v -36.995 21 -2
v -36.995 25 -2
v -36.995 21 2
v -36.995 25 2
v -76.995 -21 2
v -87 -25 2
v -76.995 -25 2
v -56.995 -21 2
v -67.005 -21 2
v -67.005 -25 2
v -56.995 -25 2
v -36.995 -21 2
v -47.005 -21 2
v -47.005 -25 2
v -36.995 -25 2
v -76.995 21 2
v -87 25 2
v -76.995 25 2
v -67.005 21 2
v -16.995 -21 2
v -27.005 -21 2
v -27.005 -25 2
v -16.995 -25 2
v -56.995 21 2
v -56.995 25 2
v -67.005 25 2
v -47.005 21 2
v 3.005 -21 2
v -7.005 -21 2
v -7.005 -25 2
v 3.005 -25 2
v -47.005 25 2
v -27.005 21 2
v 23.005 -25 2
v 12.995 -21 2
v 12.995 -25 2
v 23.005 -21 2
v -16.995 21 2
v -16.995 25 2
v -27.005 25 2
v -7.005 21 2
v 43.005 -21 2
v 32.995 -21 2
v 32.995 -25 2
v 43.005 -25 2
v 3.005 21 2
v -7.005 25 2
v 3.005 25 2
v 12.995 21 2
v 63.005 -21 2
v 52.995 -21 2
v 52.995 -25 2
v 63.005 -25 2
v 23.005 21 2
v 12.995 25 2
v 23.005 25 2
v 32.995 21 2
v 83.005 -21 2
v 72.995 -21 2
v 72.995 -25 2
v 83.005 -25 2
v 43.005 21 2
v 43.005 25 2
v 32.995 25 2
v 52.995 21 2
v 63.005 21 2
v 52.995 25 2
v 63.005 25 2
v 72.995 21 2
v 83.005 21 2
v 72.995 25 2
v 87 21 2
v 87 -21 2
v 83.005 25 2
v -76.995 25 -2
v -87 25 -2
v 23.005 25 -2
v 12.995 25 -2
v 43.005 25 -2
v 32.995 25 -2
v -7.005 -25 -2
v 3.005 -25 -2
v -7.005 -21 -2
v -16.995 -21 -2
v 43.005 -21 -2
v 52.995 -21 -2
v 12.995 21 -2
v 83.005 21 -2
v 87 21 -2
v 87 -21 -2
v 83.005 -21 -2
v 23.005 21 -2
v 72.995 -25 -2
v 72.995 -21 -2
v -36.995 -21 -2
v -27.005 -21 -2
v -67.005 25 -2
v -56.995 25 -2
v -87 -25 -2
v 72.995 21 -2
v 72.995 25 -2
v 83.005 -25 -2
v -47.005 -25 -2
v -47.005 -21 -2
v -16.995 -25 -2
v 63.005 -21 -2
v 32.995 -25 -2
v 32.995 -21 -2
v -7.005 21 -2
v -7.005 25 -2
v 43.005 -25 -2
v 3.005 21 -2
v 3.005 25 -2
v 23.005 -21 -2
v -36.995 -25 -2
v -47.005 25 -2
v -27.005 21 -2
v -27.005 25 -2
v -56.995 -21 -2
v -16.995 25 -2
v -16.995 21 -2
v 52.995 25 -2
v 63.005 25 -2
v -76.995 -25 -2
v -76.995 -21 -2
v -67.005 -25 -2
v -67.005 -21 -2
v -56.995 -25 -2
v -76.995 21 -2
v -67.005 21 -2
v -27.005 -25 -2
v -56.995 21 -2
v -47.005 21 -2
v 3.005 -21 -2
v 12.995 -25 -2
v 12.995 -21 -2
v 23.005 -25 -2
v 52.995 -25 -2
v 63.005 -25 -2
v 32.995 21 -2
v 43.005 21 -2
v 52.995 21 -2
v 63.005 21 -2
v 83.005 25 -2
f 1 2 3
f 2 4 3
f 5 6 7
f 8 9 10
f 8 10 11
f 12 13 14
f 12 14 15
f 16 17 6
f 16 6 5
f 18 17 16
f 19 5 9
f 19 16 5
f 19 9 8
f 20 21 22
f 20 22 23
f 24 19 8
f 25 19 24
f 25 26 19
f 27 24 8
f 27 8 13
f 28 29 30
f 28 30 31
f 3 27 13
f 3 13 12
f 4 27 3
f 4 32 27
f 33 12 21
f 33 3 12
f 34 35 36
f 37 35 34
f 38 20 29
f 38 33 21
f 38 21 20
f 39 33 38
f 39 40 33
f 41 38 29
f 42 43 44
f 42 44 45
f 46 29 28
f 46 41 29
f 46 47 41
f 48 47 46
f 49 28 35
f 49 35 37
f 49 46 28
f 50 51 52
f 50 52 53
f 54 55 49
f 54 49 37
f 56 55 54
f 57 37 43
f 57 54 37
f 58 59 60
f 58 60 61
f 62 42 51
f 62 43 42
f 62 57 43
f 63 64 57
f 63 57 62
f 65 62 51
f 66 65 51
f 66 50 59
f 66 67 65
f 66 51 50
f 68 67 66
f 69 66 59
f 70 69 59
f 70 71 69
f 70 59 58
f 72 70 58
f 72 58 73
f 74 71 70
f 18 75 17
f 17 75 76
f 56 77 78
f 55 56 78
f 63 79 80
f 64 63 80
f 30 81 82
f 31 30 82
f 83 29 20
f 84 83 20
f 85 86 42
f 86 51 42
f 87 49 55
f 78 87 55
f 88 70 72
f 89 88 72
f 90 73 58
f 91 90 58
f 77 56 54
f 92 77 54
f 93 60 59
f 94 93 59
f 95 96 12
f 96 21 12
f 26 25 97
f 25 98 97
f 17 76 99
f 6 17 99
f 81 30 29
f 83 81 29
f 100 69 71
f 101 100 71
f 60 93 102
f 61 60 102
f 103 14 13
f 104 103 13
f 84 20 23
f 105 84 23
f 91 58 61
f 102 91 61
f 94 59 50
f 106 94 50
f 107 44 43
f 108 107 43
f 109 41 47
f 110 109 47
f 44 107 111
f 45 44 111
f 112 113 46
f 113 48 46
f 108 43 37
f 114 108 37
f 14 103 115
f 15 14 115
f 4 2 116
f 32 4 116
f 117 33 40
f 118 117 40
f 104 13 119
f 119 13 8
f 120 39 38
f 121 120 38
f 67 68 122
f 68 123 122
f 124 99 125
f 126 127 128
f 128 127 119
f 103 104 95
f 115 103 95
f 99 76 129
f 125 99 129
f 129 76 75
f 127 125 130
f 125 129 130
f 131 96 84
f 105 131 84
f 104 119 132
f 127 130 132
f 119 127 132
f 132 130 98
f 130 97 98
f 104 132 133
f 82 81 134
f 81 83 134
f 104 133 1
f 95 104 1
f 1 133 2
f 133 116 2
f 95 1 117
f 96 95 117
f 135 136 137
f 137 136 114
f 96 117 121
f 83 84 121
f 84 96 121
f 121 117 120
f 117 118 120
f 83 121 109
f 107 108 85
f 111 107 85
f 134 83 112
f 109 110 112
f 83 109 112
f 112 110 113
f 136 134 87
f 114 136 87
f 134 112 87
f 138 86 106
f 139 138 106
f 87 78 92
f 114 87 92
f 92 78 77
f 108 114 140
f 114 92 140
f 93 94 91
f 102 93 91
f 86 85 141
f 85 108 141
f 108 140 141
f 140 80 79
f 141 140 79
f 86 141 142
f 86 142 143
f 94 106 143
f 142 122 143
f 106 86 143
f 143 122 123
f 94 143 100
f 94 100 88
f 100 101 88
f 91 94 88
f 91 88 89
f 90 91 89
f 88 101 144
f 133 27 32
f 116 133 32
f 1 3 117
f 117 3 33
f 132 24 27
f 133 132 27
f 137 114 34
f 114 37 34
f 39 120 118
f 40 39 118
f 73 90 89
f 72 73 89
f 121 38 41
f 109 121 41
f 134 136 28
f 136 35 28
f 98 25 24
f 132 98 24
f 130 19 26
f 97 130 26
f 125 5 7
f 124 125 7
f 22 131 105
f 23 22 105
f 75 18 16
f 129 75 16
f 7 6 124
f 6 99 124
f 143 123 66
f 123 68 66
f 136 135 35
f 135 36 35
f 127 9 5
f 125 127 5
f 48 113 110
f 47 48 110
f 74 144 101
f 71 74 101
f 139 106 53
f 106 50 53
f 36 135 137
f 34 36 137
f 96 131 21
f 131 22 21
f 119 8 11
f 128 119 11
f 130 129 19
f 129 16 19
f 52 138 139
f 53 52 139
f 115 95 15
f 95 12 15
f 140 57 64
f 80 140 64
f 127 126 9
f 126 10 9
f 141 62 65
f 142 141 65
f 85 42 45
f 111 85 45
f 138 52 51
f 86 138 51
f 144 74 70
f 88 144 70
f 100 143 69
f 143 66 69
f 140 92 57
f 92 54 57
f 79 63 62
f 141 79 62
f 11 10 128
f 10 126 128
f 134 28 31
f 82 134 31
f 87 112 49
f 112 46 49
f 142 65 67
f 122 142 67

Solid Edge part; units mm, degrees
sketch "Sketch1" plane through (0, 0, 0) normal (0, 0, 1) x (1, 0, 0)
  line L0 (-87, -25) -> (87, -25)
  line L1 (87, -25) -> (87, 25)
  line L2 (87, 25) -> (-87, 25)
  line L3 (-87, 25) -> (-87, -25)
  dimension "D1" = 50
  dimension "D2" = 174
extrude "Protrusion1" add sketch "Sketch1" along normal mid plane 4
sketch "Sketch2" plane through (0, 0, 2) normal (0, 0, 1) x (1, 0, 0)
  line L0 (-56.995, -25) -> (-47.005, -25)
  line L1 (-47.005, -25) -> (-47.005, -21)
  line L2 (-47.005, -21) -> (-56.995, -21)
  line L3 (-56.995, -21) -> (-56.995, -25)
  line L4 (-36.995, -25) -> (-27.005, -25)
  line L5 (-27.005, -25) -> (-27.005, -21)
  line L6 (-27.005, -21) -> (-36.995, -21)
  line L7 (-36.995, -21) -> (-36.995, -25)
  line L8 (-16.995, -25) -> (-7.005, -25)
  line L9 (-7.005, -25) -> (-7.005, -21)
  line L10 (-7.005, -21) -> (-16.995, -21)
  line L11 (-16.995, -21) -> (-16.995, -25)
  line L12 (3.005, -25) -> (12.995, -25)
  line L13 (12.995, -25) -> (12.995, -21)
  line L14 (12.995, -21) -> (3.005, -21)
  line L15 (3.005, -21) -> (3.005, -25)
  line L16 (23.005, -25) -> (32.995, -25)
  line L17 (32.995, -25) -> (32.995, -21)
  line L18 (32.995, -21) -> (23.005, -21)
  line L19 (23.005, -21) -> (23.005, -25)
  line L20 (43.005, -25) -> (52.995, -25)
  line L21 (52.995, -25) -> (52.995, -21)
  line L22 (52.995, -21) -> (43.005, -21)
  line L23 (43.005, -21) -> (43.005, -25)
  line L24 (63.005, -25) -> (72.995, -25)
  line L25 (72.995, -25) -> (72.995, -21)
  line L26 (72.995, -21) -> (63.005, -21)
  line L27 (63.005, -21) -> (63.005, -25)
  line L28 (83.005, -25) -> (92.995, -25)
  line L29 (92.995, -25) -> (92.995, -21)
  line L30 (92.995, -21) -> (83.005, -21)
  line L31 (83.005, -21) -> (83.005, -25)
  line L32 (-76.995, -25) -> (-67.005, -25)
  line L33 (-67.005, -25) -> (-67.005, -21)
  line L34 (-67.005, -21) -> (-76.995, -21)
  line L35 (-76.995, -21) -> (-76.995, -25)
  dimension "D1" = 9.99
  dimension "D2" = 4
  dimension "D3" = 9.99
  dimension "D4" = 9.99
  dimension "D5" = 9.99
  dimension "D6" = 9.99
  dimension "D7" = 9.99
  dimension "D8" = 9.99
  dimension "D9" = 9.99
  dimension "D10" = 9.99
  dimension "D11" = 4
  dimension "D12" = 4
  dimension "D13" = 4
  dimension "D14" = 4
  dimension "D15" = 4
  dimension "D16" = 4
  dimension "D17" = 4
  dimension "D18" = 4
  dimension "D19" = 15
  dimension "D20" = 20
  dimension "D21" = 20
  dimension "D22" = 20
  dimension "D23" = 20
  dimension "D24" = 20
  dimension "D25" = 20
  dimension "D26" = 20
  dimension "D27" = 20
extrude "Extrusionsausschnitt_1" cut sketch "Sketch2" against normal blind 32
mirror "Mirror1" about plane through (0, 0, 0) normal (0, -1, 0) of "Extrusionsausschnitt_1"
properties material "Holz, Kiefer"
